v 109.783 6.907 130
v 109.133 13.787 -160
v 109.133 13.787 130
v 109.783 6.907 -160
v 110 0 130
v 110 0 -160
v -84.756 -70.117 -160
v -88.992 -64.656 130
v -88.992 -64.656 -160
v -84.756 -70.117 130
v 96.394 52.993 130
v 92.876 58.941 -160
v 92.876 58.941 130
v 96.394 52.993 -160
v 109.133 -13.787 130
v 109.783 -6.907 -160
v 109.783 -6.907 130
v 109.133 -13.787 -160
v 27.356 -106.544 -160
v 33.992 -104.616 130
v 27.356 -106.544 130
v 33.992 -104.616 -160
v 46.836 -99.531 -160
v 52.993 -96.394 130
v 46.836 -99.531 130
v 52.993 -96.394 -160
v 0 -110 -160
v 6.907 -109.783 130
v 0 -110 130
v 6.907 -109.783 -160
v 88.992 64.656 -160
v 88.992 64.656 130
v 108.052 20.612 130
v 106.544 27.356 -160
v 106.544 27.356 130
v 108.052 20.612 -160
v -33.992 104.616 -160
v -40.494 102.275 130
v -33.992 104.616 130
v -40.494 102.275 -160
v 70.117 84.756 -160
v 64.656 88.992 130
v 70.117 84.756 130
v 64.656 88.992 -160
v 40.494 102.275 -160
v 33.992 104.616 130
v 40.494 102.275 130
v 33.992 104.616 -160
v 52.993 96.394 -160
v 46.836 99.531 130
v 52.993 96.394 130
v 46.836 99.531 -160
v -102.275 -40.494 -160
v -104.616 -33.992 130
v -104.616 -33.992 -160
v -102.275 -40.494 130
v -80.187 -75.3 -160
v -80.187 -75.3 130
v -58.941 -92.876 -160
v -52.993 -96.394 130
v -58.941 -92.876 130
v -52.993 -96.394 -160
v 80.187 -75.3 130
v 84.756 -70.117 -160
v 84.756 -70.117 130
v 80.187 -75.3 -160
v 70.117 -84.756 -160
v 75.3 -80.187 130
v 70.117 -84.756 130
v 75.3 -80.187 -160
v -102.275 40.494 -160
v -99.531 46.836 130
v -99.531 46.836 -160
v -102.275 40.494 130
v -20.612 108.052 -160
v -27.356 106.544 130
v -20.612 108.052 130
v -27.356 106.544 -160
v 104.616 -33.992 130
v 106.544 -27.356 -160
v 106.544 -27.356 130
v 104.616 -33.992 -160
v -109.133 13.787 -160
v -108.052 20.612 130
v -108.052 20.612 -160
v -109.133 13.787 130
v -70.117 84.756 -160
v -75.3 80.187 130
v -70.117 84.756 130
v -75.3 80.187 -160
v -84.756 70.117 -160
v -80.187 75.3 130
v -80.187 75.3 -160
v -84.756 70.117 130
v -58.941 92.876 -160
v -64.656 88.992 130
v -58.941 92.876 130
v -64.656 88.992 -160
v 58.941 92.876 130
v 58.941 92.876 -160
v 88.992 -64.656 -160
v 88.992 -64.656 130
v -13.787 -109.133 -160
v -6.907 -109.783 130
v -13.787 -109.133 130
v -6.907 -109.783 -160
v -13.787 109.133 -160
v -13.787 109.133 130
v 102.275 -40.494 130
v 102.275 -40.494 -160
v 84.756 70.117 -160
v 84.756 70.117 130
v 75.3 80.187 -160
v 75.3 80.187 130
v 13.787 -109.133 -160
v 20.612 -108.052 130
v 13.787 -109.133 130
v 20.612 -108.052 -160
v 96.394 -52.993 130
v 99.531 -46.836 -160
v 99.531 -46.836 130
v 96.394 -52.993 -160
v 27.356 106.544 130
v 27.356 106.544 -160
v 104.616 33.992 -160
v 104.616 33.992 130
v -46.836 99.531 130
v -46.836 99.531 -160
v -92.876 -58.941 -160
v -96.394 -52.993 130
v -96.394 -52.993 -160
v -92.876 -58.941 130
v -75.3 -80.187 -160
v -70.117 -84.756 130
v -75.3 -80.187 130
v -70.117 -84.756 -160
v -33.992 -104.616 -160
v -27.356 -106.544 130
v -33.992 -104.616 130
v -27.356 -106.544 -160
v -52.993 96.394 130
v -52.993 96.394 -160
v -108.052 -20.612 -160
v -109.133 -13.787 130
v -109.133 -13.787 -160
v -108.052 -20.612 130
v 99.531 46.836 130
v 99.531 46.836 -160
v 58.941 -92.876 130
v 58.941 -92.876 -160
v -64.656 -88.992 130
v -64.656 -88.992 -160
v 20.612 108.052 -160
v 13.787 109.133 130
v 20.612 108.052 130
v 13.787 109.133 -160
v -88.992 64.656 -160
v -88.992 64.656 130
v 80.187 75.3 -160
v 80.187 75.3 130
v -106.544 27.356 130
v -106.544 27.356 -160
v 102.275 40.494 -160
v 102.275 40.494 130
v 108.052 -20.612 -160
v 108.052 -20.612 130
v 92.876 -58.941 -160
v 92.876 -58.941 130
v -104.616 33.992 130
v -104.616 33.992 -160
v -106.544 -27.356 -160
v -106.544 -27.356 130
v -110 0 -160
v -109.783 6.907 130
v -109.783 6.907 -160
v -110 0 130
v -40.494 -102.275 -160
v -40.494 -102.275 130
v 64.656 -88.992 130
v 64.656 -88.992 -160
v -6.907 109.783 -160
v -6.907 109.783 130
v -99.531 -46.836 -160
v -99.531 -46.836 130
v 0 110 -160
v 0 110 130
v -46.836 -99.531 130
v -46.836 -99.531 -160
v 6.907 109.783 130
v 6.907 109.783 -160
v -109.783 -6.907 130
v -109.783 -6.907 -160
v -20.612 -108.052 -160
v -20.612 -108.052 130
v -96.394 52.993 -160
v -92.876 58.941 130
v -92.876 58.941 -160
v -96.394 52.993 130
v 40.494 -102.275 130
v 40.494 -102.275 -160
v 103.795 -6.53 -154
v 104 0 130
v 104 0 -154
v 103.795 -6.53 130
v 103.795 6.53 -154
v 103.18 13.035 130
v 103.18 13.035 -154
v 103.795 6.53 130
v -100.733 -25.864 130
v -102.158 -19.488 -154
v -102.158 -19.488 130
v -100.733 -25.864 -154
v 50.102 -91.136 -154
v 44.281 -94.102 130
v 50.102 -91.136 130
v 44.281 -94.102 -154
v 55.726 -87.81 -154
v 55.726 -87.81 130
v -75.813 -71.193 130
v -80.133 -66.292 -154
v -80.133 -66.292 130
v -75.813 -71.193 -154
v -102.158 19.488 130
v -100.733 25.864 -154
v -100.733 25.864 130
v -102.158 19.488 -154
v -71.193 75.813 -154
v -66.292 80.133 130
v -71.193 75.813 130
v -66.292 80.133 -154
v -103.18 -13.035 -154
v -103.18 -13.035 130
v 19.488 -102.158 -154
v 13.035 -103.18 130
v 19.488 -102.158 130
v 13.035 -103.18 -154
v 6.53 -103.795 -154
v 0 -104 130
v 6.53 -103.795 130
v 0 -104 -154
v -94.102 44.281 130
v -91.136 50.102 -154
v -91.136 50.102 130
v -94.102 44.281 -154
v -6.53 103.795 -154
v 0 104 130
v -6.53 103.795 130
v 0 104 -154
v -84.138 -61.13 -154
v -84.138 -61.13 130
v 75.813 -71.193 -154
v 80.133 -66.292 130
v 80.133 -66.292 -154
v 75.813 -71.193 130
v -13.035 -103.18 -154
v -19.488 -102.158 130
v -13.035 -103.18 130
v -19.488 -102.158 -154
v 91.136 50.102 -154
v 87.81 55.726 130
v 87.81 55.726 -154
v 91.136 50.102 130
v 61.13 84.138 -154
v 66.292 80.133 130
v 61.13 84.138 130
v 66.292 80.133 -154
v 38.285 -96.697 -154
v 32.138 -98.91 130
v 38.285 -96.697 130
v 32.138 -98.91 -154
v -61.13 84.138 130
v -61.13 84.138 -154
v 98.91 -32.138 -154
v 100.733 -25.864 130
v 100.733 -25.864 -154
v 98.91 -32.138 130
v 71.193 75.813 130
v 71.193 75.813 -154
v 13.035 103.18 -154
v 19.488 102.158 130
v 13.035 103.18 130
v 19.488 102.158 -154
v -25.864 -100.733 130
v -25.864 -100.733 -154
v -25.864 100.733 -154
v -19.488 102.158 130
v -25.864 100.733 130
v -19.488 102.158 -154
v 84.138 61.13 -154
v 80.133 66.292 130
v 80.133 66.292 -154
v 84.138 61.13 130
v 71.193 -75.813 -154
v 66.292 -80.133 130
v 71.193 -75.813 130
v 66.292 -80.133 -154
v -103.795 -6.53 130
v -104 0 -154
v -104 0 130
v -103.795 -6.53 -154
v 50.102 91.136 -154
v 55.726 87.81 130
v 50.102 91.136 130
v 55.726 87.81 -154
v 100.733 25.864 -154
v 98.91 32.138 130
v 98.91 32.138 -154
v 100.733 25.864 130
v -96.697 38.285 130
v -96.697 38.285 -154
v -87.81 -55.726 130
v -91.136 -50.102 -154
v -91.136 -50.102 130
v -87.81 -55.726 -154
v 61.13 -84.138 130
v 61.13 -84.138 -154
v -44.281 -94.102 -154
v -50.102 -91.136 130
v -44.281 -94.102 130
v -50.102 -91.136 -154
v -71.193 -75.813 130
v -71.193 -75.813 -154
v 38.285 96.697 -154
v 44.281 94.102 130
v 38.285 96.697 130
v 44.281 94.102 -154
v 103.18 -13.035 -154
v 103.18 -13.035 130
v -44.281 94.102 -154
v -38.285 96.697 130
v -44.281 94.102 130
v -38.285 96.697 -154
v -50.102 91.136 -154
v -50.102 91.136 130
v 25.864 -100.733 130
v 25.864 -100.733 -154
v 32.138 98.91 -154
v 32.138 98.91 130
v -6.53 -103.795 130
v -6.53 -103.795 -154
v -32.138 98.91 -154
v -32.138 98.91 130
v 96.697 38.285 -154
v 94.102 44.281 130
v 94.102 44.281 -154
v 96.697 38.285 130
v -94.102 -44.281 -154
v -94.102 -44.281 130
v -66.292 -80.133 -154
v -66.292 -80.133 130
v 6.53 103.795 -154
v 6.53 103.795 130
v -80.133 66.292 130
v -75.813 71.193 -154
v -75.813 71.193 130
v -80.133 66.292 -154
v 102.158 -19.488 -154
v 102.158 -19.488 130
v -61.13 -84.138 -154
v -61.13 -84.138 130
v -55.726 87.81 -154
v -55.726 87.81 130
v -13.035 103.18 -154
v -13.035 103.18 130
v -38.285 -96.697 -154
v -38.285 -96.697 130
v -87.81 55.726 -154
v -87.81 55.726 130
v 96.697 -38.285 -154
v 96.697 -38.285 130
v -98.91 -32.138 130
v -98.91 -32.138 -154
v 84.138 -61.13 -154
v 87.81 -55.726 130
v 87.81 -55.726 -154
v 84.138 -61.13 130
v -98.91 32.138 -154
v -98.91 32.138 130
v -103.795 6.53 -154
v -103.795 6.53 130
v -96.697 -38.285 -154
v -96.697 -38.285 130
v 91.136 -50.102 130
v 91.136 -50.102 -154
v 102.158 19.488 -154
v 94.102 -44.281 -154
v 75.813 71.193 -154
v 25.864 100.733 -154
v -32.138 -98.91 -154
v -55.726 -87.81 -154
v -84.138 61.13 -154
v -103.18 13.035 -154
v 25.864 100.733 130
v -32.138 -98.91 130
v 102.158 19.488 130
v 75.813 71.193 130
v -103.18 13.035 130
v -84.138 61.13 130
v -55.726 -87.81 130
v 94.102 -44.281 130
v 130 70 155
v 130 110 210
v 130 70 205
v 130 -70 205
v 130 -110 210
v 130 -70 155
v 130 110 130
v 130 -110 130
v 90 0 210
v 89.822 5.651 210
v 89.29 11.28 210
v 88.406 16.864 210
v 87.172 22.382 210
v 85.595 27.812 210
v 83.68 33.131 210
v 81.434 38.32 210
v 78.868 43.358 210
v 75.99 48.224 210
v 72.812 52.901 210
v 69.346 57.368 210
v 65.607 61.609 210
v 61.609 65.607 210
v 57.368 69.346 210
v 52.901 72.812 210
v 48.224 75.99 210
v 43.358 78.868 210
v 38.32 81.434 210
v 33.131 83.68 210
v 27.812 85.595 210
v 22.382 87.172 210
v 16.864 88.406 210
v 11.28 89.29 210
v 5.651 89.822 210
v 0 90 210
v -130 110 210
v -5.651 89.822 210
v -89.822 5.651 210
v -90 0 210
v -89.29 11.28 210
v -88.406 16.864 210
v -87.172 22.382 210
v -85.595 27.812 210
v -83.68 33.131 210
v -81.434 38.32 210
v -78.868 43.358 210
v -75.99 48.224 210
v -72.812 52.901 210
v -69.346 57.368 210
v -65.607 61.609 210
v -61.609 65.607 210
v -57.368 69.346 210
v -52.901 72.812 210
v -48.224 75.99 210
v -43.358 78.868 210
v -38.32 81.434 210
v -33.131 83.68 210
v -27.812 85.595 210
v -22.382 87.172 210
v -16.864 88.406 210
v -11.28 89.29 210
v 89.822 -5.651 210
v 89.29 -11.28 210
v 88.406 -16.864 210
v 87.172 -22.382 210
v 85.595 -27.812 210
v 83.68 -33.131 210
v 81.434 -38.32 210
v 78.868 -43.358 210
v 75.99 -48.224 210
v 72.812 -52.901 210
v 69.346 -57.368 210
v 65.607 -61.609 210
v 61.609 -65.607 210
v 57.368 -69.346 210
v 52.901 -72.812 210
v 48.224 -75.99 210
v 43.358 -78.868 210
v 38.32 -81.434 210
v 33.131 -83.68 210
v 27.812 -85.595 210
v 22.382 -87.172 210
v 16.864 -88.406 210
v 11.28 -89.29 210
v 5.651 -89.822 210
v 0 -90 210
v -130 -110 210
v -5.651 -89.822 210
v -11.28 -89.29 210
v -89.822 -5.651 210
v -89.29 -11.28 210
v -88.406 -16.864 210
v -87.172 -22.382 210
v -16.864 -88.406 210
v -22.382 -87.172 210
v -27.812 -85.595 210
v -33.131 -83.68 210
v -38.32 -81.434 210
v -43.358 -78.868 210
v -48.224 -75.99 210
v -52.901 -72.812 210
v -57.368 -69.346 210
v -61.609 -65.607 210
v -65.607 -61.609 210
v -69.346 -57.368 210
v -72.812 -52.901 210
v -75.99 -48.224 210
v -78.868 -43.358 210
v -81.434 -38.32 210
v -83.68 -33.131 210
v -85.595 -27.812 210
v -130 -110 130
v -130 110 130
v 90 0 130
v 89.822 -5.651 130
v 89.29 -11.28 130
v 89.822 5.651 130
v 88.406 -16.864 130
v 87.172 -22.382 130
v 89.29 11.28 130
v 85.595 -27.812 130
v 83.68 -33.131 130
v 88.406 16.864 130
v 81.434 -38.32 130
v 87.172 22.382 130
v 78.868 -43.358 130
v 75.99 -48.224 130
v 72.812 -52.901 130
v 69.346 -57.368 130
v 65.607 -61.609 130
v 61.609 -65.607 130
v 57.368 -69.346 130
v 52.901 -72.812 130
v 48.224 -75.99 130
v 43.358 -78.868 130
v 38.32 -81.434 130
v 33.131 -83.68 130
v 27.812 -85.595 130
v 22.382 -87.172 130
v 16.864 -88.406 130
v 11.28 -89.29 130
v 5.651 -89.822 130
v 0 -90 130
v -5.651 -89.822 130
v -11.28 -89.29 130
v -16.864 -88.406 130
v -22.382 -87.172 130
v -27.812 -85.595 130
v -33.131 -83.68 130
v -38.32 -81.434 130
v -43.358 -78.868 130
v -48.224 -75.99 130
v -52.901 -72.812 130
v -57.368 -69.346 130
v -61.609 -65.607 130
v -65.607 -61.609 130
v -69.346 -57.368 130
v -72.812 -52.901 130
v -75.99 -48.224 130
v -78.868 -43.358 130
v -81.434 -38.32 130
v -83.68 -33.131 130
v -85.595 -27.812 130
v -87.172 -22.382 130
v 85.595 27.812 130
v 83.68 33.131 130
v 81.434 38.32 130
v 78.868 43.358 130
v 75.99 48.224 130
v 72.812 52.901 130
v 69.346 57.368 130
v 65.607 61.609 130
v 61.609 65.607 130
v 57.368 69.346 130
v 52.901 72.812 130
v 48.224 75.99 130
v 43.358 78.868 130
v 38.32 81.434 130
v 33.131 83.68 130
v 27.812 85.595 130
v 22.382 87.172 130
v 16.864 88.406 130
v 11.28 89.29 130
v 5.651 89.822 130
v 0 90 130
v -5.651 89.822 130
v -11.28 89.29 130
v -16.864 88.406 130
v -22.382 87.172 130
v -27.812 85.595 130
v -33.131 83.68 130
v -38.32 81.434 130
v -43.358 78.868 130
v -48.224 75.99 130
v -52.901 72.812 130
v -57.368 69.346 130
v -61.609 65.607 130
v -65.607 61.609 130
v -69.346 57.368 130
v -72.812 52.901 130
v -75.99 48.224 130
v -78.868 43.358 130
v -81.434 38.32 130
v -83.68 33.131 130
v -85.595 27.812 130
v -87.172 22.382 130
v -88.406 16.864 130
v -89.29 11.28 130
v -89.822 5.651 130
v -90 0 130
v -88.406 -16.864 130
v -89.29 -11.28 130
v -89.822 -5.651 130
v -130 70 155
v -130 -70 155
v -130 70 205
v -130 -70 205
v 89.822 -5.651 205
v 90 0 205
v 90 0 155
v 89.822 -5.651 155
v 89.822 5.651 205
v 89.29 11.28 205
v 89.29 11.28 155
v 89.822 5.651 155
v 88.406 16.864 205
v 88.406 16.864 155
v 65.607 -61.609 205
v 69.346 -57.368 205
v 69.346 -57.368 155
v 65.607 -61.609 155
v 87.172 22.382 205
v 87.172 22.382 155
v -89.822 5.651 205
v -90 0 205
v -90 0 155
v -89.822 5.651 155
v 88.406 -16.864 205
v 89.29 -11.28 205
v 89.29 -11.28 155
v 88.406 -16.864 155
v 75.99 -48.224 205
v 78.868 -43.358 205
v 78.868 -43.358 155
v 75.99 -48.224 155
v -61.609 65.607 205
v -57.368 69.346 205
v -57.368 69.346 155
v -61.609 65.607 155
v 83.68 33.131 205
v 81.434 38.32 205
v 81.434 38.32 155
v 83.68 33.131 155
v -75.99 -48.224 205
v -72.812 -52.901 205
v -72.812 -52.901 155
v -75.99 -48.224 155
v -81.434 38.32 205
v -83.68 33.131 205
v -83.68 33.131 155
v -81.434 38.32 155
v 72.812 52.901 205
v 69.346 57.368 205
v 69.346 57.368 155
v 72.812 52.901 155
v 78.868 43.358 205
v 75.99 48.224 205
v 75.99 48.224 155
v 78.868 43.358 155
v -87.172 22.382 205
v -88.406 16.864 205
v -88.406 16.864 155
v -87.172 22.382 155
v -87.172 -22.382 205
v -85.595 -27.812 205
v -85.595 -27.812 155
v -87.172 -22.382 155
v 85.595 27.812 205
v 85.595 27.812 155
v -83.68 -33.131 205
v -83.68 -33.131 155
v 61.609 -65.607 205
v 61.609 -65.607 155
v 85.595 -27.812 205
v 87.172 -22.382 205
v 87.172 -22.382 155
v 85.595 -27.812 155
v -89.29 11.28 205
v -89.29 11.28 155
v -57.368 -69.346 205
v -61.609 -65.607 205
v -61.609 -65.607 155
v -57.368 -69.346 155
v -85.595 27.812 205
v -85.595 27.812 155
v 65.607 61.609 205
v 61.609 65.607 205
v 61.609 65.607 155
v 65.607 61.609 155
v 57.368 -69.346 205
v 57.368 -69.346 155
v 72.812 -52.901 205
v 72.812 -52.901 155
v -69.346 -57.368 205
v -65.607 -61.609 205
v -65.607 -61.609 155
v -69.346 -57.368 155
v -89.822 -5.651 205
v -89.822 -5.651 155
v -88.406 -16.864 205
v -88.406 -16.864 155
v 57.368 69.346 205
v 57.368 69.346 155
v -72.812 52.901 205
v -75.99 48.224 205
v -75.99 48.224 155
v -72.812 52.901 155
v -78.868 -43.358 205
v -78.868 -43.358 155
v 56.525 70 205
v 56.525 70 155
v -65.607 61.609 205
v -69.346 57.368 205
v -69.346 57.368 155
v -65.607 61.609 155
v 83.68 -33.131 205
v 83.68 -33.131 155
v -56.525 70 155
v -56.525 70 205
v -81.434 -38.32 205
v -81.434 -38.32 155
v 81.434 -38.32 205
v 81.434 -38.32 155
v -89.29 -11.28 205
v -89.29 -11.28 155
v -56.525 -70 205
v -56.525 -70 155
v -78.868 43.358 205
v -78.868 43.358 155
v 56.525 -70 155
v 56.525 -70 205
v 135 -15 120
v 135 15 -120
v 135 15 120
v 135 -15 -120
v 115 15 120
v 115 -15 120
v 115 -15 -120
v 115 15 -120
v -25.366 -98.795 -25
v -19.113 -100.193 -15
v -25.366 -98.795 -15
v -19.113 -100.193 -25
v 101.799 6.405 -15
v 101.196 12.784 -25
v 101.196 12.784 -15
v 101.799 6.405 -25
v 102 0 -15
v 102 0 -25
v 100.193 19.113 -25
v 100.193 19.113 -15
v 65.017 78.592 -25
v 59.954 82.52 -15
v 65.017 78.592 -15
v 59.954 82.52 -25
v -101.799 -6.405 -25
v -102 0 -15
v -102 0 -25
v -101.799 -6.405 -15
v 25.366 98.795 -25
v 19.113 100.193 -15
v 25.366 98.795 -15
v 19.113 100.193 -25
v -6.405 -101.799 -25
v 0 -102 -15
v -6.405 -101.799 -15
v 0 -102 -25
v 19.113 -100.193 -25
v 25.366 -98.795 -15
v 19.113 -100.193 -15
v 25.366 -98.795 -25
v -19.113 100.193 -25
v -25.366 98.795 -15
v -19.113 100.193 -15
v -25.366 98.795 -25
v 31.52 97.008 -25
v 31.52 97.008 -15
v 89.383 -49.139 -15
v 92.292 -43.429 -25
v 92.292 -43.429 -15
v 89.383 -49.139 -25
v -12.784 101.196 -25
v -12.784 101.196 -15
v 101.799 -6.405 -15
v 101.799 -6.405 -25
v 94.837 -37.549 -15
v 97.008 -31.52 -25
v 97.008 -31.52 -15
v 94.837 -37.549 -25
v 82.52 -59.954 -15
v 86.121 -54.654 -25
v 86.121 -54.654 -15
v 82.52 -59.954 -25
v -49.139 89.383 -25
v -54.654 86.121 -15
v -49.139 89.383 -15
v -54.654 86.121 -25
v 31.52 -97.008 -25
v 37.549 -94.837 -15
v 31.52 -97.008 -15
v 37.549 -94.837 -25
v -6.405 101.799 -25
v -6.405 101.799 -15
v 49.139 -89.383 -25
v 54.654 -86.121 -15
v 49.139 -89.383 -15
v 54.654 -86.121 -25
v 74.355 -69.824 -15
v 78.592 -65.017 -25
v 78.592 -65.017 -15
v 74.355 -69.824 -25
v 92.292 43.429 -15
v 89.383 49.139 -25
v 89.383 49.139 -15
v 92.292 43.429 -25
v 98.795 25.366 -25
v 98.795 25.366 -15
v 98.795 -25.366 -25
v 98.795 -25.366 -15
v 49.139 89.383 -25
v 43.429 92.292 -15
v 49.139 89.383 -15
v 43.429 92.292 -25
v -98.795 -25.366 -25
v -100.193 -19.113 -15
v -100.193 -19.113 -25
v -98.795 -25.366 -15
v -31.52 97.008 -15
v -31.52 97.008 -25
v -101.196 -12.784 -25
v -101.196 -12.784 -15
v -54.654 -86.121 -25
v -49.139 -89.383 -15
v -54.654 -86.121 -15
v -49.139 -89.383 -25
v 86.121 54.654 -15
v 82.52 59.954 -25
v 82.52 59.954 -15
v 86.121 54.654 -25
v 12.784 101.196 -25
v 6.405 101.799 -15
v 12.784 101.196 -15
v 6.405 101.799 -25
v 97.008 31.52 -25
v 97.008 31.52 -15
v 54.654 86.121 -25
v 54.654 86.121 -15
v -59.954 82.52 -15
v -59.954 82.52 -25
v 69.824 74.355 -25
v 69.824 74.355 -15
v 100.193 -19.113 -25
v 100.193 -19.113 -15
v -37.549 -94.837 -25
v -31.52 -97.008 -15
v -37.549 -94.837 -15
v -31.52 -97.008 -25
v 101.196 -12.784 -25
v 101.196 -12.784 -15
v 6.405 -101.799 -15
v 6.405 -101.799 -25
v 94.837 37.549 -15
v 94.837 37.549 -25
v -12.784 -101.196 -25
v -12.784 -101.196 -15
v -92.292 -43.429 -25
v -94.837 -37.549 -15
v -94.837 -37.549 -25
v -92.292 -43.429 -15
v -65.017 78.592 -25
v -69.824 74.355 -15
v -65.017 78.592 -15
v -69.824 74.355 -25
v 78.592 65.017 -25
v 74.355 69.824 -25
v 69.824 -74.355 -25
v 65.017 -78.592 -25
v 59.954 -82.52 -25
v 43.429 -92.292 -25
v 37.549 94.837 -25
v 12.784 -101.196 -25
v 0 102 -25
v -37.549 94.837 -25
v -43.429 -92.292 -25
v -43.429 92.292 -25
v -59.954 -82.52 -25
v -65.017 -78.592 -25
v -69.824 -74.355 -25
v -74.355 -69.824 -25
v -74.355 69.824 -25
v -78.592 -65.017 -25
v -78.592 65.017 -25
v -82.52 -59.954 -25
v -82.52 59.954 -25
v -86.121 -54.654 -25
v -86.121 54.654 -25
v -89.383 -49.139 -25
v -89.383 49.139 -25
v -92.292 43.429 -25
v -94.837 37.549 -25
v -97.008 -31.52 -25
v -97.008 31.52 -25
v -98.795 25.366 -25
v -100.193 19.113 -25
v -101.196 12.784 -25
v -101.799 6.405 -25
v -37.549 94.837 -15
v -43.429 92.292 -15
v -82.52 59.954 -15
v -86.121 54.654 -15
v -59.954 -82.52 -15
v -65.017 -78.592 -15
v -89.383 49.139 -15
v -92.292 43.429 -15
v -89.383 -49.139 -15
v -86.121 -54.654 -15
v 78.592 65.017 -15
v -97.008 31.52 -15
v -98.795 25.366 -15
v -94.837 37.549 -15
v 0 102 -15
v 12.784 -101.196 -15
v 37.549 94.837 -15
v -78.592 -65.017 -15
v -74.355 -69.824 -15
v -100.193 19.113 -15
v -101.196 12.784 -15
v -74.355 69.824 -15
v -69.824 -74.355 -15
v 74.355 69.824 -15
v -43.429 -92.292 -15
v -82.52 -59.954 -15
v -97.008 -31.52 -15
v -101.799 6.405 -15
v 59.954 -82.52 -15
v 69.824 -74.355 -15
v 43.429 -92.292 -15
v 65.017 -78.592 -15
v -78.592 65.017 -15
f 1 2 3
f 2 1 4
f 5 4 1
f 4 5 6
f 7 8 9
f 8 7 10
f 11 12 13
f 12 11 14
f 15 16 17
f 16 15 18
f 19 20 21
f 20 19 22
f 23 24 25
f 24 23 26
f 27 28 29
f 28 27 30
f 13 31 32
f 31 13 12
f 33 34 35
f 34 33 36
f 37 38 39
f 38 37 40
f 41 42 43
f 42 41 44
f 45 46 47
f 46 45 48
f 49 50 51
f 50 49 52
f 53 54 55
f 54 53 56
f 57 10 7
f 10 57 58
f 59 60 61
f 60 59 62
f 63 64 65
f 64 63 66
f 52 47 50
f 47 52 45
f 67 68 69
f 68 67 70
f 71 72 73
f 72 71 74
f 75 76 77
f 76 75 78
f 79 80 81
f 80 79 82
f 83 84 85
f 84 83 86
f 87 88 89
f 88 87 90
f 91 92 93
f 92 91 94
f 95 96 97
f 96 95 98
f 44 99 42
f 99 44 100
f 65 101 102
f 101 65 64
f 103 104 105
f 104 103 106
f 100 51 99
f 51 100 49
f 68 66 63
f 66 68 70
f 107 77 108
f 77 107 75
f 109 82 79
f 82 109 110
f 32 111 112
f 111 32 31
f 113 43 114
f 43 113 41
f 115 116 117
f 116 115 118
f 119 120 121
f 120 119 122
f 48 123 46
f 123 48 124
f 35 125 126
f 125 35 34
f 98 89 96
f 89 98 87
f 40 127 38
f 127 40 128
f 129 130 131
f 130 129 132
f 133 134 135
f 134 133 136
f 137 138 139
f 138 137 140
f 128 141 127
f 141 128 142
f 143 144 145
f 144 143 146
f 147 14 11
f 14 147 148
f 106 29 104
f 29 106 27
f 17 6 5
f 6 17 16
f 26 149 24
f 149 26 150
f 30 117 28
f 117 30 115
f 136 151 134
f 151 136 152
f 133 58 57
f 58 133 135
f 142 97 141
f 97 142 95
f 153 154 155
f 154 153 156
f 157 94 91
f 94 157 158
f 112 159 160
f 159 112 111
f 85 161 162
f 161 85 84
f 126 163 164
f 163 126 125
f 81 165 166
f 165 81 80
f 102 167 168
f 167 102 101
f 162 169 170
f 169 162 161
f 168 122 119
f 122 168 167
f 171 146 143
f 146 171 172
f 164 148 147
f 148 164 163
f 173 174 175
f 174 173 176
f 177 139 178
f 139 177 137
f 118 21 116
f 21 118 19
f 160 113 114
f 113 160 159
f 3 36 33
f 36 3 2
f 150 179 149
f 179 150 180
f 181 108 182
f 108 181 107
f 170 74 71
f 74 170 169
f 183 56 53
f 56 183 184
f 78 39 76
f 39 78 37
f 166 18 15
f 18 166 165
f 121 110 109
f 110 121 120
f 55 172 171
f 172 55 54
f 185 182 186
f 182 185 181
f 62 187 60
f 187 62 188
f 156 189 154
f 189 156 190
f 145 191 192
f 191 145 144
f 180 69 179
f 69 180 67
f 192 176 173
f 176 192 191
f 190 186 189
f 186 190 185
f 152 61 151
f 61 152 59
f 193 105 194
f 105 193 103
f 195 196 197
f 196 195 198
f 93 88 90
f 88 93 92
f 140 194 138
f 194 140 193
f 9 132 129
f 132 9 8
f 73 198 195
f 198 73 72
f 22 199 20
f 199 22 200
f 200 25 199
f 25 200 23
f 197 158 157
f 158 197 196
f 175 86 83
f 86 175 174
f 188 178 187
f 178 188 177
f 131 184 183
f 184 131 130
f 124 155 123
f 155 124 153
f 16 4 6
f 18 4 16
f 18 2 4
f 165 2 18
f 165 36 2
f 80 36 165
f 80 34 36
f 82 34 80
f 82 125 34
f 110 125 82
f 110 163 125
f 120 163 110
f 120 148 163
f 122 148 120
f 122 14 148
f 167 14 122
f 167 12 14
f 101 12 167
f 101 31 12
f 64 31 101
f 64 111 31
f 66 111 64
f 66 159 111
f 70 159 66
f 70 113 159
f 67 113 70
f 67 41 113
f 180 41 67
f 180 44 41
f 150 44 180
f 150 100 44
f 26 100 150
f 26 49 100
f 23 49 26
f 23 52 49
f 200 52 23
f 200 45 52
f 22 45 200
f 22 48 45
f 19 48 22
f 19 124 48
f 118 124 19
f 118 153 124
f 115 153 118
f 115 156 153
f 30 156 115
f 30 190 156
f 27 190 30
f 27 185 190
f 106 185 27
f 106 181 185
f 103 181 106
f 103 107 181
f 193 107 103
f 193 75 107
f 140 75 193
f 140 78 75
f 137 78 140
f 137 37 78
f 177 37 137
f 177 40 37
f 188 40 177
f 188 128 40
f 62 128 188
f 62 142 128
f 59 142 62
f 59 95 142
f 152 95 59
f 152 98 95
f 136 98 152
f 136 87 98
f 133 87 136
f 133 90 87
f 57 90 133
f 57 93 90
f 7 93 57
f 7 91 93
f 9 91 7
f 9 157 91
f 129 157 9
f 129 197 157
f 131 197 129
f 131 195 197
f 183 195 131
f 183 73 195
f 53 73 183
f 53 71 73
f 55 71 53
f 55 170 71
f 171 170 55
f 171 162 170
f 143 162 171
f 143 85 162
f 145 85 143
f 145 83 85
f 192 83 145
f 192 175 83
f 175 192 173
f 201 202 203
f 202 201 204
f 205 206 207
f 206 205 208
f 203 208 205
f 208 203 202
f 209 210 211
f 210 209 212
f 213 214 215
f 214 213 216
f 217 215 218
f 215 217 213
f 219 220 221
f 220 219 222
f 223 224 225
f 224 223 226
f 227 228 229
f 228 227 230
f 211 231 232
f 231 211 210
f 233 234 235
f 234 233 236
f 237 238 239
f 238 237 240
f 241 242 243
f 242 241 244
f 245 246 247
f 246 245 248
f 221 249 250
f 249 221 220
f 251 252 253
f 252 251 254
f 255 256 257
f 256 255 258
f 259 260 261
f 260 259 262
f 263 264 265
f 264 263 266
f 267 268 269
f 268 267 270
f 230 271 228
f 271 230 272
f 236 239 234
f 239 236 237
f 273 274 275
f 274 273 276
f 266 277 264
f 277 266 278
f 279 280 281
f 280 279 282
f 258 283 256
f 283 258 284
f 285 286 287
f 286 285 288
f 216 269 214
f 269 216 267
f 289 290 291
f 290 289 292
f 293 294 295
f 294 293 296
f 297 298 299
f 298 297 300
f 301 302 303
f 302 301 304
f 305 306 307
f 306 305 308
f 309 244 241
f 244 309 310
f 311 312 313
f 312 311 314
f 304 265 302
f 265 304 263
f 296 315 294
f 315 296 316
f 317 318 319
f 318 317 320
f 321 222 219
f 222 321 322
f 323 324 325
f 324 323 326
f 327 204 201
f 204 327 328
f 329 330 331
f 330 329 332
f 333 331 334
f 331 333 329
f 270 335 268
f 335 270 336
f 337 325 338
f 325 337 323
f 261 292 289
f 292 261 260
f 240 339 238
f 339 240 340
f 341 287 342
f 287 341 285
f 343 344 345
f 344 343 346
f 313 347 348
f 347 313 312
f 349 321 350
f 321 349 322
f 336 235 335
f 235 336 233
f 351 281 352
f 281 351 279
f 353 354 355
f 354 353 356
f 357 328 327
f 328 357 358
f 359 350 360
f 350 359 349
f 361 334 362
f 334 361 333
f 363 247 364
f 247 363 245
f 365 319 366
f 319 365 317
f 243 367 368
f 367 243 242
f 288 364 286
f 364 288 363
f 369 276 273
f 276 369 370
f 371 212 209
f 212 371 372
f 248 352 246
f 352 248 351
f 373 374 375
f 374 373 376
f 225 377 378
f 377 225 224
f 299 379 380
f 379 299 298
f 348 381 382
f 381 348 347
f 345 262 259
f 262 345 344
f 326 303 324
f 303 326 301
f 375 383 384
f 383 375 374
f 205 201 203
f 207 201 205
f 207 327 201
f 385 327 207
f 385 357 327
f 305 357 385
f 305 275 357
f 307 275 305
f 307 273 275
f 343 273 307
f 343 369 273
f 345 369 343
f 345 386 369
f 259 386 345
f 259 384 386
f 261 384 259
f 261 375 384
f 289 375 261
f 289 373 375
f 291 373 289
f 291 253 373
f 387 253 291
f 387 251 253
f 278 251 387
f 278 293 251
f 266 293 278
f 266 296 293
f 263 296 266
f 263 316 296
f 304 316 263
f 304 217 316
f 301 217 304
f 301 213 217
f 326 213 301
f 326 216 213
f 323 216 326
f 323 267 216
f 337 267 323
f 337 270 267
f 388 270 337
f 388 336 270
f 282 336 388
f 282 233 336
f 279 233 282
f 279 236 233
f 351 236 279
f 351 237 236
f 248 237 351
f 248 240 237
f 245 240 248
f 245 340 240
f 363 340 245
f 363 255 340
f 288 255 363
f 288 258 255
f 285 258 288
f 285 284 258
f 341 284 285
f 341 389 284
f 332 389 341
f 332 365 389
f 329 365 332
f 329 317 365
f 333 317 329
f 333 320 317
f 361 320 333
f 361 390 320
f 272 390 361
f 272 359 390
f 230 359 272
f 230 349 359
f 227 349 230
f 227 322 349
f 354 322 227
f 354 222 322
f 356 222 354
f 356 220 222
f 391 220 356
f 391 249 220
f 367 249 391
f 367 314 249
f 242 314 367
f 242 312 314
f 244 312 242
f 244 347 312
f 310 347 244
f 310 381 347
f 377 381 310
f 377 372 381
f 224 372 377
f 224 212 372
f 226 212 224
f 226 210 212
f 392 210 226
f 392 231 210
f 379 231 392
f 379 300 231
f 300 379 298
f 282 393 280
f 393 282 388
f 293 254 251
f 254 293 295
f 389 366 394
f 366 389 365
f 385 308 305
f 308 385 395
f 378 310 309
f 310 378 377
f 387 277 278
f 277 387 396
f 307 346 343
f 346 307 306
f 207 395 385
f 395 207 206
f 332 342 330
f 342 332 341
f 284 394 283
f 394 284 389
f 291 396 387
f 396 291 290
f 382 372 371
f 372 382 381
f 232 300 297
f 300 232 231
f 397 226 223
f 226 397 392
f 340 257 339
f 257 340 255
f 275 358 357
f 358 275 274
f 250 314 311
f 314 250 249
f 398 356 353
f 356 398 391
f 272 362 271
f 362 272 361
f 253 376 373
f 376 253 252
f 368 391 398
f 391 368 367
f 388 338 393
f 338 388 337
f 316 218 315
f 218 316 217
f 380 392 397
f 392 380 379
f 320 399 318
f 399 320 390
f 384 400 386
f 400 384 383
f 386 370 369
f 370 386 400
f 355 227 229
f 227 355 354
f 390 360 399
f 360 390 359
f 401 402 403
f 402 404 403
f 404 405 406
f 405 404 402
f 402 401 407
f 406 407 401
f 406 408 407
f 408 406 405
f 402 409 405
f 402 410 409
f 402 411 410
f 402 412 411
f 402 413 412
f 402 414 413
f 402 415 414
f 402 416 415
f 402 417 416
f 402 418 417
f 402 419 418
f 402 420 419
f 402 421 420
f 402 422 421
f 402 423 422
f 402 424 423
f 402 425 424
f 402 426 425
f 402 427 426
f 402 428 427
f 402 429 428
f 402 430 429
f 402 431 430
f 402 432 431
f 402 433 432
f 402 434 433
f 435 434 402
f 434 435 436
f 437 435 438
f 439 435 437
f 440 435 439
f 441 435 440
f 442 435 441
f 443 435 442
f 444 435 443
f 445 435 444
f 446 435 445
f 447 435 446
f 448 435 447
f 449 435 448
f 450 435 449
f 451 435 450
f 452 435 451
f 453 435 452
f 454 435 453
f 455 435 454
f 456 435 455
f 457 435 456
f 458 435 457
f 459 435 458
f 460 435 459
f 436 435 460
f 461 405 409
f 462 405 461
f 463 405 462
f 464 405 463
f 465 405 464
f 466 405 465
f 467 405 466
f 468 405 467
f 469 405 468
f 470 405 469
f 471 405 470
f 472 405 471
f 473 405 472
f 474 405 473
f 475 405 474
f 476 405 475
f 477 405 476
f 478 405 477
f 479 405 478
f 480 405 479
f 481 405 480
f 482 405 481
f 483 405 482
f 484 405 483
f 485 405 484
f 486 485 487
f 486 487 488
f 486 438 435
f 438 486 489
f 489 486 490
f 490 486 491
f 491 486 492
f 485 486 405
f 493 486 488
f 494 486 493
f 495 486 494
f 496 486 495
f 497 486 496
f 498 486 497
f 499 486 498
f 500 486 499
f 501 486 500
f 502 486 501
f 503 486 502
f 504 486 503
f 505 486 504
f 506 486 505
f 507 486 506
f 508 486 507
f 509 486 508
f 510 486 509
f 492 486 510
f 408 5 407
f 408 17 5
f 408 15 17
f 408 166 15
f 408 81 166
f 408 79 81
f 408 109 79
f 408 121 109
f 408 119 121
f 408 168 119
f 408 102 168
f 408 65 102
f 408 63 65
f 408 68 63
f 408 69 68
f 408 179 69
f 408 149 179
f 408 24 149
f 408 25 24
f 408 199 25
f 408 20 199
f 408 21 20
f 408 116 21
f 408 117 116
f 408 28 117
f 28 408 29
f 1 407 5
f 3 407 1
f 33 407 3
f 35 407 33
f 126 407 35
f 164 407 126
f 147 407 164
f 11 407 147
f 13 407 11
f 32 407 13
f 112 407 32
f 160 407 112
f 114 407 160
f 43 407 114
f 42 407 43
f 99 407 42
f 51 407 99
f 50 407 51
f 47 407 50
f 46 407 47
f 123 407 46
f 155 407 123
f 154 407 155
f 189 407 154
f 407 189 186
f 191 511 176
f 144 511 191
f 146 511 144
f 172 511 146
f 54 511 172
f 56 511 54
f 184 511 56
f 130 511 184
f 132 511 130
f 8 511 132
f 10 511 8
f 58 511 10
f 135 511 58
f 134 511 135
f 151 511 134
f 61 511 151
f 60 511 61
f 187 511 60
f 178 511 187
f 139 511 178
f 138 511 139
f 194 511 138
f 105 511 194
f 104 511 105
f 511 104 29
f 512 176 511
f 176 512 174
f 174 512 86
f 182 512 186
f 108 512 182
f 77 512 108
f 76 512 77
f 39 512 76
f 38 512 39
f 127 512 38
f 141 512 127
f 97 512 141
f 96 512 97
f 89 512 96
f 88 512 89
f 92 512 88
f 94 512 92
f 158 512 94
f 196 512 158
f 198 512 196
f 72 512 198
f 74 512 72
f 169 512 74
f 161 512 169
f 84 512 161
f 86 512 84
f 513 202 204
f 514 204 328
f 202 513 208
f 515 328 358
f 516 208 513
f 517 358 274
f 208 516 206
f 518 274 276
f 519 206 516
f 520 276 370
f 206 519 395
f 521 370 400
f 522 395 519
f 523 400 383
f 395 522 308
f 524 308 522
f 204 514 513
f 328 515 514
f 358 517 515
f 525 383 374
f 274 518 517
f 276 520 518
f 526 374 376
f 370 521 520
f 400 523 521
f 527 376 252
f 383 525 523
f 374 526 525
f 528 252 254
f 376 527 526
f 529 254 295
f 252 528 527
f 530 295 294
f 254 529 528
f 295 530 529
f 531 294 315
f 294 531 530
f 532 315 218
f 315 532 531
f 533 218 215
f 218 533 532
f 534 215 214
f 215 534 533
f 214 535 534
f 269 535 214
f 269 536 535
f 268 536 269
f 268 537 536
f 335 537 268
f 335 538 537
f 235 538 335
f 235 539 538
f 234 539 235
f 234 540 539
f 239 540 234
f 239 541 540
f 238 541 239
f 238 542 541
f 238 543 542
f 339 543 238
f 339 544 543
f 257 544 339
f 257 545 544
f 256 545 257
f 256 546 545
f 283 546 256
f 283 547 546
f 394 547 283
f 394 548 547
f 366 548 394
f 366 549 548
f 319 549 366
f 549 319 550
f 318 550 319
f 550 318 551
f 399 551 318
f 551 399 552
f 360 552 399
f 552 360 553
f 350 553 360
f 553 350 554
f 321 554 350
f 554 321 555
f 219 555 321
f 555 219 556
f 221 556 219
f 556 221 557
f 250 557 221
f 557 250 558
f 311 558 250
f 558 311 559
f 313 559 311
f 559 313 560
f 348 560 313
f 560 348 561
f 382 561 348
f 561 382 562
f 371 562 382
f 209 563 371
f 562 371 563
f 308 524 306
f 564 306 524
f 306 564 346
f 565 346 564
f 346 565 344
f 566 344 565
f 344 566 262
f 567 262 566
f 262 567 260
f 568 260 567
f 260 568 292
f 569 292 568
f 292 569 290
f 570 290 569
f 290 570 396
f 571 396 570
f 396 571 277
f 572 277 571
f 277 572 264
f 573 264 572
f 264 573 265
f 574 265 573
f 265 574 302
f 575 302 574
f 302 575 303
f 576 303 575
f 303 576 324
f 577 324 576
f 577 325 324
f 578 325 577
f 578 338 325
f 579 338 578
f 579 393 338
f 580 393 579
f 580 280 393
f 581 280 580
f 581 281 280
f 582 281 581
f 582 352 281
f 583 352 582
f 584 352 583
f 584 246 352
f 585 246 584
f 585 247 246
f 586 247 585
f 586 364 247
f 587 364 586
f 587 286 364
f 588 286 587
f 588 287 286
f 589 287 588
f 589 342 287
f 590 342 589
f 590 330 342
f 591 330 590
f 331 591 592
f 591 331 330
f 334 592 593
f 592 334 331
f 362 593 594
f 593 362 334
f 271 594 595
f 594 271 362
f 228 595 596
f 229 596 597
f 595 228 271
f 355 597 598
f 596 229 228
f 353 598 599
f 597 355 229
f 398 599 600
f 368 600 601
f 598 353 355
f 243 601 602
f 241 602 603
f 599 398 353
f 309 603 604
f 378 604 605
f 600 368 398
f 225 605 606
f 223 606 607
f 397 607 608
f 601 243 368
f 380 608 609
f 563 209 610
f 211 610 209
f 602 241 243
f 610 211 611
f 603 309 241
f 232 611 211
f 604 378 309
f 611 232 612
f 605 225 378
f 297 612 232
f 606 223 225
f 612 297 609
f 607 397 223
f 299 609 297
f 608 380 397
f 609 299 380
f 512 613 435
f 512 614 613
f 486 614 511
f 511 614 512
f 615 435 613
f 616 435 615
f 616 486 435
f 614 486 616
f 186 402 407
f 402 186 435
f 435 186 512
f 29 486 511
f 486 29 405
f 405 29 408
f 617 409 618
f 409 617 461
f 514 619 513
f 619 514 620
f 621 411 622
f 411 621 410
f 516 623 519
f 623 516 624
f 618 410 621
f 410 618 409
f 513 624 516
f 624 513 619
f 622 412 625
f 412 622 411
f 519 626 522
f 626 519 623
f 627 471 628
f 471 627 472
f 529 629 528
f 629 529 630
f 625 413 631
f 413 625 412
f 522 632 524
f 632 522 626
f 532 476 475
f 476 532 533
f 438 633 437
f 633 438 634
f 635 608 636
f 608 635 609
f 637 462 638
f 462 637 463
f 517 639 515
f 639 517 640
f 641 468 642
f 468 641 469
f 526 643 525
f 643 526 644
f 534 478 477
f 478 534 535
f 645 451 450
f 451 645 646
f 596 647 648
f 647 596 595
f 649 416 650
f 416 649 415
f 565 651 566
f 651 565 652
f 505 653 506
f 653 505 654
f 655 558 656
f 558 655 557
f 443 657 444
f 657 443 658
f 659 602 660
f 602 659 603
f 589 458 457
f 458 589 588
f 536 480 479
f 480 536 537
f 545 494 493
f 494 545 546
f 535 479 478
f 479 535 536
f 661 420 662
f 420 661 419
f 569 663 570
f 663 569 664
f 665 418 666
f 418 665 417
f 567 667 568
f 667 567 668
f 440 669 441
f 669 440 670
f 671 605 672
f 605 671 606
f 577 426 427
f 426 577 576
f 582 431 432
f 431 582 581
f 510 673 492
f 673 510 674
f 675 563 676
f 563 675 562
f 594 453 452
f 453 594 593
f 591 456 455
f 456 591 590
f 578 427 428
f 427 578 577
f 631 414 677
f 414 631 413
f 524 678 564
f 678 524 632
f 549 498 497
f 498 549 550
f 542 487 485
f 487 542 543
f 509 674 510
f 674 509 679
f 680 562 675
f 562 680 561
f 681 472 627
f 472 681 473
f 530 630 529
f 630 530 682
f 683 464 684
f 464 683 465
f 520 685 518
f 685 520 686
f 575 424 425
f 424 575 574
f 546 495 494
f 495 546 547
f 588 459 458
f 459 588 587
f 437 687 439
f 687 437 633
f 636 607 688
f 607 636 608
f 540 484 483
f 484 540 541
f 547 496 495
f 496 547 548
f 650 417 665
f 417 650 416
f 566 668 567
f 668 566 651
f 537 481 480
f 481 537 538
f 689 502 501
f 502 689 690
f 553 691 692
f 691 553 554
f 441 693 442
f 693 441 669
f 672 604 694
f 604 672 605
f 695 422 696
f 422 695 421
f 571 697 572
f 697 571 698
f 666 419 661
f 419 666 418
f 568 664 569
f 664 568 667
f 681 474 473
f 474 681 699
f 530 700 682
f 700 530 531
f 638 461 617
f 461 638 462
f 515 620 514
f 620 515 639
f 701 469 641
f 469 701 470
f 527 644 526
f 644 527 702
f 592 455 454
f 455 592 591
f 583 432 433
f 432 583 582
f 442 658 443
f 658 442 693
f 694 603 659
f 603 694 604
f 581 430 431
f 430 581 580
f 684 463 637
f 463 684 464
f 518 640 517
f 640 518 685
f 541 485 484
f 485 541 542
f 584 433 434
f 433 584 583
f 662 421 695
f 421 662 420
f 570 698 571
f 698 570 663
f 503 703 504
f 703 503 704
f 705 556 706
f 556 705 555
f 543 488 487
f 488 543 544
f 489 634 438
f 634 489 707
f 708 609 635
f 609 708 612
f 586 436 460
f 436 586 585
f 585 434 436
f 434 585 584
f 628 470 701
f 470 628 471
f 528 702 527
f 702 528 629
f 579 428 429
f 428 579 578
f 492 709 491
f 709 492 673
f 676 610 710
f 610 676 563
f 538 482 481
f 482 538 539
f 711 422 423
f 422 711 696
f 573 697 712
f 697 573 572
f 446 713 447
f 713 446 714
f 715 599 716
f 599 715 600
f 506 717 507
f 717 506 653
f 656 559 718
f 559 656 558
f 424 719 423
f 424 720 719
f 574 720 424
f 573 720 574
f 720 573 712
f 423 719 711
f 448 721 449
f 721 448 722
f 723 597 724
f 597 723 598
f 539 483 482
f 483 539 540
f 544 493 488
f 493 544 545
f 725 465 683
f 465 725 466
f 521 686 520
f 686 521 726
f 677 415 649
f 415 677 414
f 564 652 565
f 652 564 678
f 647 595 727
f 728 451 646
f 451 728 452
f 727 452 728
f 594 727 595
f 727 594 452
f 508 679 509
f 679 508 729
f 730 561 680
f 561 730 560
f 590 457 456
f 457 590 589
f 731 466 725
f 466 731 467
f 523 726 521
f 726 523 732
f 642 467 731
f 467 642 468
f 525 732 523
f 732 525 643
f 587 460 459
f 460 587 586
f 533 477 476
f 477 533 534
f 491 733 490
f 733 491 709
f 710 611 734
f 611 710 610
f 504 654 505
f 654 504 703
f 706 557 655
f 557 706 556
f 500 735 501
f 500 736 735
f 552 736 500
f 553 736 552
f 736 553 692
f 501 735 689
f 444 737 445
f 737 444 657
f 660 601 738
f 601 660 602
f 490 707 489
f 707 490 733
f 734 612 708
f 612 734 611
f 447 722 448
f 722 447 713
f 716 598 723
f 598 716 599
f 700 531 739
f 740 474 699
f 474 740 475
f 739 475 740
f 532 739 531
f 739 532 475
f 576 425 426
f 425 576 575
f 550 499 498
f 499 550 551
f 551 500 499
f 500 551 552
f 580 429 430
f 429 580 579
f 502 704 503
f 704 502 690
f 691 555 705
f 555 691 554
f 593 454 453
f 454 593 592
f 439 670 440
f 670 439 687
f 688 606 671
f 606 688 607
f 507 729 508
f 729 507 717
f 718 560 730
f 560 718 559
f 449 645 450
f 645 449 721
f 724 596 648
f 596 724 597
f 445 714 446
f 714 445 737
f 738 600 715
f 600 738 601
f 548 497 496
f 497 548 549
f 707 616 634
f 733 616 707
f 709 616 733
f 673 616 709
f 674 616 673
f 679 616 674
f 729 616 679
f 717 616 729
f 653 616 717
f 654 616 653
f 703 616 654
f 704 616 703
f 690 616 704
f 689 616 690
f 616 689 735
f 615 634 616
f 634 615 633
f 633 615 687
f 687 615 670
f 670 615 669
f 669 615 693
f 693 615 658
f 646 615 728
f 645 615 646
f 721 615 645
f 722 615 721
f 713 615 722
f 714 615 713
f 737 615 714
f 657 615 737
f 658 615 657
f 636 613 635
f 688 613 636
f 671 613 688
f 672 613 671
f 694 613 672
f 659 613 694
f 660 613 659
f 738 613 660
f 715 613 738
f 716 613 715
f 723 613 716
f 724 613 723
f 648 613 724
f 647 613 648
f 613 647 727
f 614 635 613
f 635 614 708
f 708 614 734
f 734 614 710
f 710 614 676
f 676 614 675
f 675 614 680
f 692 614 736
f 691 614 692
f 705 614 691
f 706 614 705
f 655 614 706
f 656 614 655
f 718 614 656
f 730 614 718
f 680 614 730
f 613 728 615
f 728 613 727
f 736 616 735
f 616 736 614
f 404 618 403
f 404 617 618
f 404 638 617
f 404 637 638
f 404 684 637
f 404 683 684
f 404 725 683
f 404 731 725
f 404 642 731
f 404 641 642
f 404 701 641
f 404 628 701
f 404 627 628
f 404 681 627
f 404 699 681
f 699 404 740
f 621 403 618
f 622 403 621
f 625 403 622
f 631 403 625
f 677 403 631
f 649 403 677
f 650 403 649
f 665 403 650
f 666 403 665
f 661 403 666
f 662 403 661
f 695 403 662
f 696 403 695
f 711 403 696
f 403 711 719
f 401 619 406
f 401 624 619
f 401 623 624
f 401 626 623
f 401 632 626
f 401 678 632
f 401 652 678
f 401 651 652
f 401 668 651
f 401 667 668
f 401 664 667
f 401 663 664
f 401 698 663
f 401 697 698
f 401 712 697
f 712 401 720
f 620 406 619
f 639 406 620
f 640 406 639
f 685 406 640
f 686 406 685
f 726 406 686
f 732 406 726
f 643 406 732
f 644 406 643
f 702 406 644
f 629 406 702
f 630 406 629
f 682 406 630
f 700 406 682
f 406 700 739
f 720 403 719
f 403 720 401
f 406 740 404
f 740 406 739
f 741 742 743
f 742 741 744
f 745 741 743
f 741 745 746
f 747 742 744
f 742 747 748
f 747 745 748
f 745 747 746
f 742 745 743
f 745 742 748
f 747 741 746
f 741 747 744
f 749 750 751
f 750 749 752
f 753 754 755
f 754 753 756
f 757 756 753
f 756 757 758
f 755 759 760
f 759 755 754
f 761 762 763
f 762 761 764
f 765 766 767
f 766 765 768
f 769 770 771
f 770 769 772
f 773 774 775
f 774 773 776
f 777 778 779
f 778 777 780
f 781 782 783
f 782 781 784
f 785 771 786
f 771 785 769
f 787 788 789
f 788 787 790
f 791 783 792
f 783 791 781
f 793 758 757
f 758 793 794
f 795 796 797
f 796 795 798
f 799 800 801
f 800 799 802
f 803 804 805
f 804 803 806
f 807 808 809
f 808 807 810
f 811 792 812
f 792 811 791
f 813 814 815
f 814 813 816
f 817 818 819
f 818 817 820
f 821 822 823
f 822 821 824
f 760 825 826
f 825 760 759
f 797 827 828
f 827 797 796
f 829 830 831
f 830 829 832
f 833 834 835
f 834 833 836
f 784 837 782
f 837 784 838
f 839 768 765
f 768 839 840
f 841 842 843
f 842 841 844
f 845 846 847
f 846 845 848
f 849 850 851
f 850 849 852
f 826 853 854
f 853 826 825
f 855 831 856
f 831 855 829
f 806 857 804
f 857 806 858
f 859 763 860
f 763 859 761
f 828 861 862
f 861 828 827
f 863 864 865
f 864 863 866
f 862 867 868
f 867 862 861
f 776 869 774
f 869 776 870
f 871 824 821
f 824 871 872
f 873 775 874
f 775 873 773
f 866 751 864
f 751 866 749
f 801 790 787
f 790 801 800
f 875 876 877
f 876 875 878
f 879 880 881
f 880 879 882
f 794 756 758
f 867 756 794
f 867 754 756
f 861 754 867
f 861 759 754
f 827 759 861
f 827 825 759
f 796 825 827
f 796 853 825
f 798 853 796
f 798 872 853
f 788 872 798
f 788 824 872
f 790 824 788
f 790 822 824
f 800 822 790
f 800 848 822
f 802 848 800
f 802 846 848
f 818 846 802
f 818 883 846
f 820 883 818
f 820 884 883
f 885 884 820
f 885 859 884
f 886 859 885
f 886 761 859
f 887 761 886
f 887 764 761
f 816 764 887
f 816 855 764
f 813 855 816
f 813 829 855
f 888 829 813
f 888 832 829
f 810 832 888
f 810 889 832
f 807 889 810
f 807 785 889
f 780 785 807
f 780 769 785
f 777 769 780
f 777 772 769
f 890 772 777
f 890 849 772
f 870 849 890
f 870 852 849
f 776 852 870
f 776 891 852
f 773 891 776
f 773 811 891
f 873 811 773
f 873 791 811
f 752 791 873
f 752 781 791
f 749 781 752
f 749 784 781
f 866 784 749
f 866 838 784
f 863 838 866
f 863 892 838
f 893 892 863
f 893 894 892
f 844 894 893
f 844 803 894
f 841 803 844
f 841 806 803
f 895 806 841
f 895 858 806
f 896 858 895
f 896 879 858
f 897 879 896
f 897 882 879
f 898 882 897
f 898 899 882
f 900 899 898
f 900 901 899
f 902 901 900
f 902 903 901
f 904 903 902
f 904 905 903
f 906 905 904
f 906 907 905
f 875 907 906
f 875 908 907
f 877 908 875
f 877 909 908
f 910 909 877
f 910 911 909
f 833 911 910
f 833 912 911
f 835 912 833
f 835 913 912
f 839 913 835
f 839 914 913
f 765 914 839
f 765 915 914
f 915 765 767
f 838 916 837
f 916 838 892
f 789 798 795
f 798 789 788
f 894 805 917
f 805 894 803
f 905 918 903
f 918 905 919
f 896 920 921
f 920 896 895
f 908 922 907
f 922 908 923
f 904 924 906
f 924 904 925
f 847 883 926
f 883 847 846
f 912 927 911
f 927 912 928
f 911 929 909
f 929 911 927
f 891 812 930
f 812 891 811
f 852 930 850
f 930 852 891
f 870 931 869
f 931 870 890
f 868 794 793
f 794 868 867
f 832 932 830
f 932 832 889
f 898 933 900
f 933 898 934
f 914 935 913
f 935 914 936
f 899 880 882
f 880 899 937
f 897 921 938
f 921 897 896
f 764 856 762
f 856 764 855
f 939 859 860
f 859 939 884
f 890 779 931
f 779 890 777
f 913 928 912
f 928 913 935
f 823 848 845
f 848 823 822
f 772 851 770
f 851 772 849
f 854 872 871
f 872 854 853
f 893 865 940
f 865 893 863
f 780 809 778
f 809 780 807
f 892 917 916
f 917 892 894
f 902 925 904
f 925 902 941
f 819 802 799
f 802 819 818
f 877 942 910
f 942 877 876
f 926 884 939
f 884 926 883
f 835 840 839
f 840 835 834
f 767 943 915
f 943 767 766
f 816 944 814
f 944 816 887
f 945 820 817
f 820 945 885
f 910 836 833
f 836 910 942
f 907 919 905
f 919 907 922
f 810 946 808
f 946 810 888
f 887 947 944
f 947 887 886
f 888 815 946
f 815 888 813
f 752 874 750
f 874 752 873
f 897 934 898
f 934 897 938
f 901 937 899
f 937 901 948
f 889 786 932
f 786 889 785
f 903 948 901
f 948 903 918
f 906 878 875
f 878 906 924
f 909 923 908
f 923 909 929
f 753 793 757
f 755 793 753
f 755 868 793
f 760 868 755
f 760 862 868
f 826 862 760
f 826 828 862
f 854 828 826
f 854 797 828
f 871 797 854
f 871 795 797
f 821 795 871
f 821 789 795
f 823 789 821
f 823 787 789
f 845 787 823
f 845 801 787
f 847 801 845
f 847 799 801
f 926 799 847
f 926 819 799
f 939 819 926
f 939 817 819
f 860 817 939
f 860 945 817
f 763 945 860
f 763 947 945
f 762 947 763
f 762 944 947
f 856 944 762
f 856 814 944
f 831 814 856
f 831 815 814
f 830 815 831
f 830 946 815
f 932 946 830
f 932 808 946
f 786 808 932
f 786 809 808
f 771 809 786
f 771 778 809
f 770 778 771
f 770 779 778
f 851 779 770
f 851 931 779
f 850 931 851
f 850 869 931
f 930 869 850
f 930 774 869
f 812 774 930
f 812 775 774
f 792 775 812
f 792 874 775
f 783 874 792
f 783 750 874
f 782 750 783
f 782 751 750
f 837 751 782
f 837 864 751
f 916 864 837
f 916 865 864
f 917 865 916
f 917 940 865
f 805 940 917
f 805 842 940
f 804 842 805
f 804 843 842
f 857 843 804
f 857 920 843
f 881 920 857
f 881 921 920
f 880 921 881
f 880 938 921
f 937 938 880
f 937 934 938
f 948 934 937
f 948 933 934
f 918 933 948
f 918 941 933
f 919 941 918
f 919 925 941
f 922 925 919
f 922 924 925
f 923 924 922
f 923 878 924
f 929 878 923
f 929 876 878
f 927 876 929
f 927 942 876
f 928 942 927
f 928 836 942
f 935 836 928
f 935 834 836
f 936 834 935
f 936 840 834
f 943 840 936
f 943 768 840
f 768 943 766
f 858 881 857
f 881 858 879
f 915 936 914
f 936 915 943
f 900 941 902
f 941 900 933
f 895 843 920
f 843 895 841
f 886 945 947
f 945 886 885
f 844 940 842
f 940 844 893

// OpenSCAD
// ============================================================================
// PROJECT: XXXG-00W0 WING GUNDAM ZERO EW - PURE MECHANICAL SUITE
// COMPONENT: NON-ELECTRONIC SOLID WASTE RECEPTACLE & APERTURE VAULT
// PRODUCTION SPEC: NORTHROP GRUMMAN AC DELCO HIGH-PRESSURE O-RING COMPLIANCE
// LAYOUT PARITY: LOWER HULL FLOOR-WALL JUNCTION CONCEALED MOUNTING
// ============================================================================

$fn = 100; // High-precision circular resolution segment count

// Structural Cockpit Constraints (1:1 Metric Airframe Scale - mm)
container_height = 420;                  // Total vertical assembly height (mm)
cylinder_diameter = 220;                 // Outer diameter of waste storage vault (mm)
wall_thickness = 6;                      // Reinforced structural titanium thickness (mm)
supply_box_w = 120;                      // Cleaning asset storage bin transverse width (mm)

module Solid_Waste_Containment_Forge() {
    // 1. Primary 4.5-Liter High-Pressure Storage Cylinder
    color([0.25, 0.25, 0.27]) { // Raw Titanium Industrial Core Spec
        difference() {
            // Main vertical containment cylinder hull
            cylinder(h = container_height - 100, d = cylinder_diameter, center = true);
            // Core internal storage capacity cavity
            cylinder(h = container_height - 100 - (wall_thickness * 2), d = cylinder_diameter - (wall_thickness * 2), center = true);
            
            // Upper seal ring cutout designed for the AC Delco O-ring seat manifold
            translate([0, 0, (container_height - 100)/2 - 10])
                cylinder(h = 20, d = cylinder_diameter + 4, center = true);
        }
    }
    
    // 2. Integrated Cleaning Asset Storage Manifold (Mounts over the main cylinder)
    color([0.35, 0.35, 0.38]) translate([0, 0, (container_height/2) - 40]) {
        difference() {
            // Main upper storage housing block
            cube([cylinder_diameter + 40, cylinder_diameter, 80], center = true);
            
            // Central drop aperture path where bags enter the lower cylinder
            cylinder(h = 90, d = cylinder_diameter - 40, center = true);
            
            // Storage Bin A: Flat-packed zipper bag tray slot
            translate([-(cylinder_diameter/2), 0, 10])
                cube([supply_box_w, 140, 50], center = true);
                
            // Storage Bin B: Moist antimicrobial wet wipe pop-up bin slot
            translate([(cylinder_diameter/2), 0, 10])
                cube([supply_box_w, 140, 50], center = true);
        }
    }
    
    // 3. Manual Crush Plate & Compactor Lever Arm Assembly
    color([0.5, 0.5, 0.52]) {
        // External side-mounted mechanical leverage actuator handle
        translate([cylinder_diameter/2 + 15, 0, 0])
            cube([20, 30, 240], center = true);
            
        // Internal horizontal packing disc (Renders inside the core cavity slot)
        translate([0, 0, -20])
            cylinder(h = 10, d = cylinder_diameter - wall_thickness * 2 - 4, center = true);
    }
}

// Render Master Mechanical Assembly Component to Parameter Workspace
Solid_Waste_Containment_Forge();
